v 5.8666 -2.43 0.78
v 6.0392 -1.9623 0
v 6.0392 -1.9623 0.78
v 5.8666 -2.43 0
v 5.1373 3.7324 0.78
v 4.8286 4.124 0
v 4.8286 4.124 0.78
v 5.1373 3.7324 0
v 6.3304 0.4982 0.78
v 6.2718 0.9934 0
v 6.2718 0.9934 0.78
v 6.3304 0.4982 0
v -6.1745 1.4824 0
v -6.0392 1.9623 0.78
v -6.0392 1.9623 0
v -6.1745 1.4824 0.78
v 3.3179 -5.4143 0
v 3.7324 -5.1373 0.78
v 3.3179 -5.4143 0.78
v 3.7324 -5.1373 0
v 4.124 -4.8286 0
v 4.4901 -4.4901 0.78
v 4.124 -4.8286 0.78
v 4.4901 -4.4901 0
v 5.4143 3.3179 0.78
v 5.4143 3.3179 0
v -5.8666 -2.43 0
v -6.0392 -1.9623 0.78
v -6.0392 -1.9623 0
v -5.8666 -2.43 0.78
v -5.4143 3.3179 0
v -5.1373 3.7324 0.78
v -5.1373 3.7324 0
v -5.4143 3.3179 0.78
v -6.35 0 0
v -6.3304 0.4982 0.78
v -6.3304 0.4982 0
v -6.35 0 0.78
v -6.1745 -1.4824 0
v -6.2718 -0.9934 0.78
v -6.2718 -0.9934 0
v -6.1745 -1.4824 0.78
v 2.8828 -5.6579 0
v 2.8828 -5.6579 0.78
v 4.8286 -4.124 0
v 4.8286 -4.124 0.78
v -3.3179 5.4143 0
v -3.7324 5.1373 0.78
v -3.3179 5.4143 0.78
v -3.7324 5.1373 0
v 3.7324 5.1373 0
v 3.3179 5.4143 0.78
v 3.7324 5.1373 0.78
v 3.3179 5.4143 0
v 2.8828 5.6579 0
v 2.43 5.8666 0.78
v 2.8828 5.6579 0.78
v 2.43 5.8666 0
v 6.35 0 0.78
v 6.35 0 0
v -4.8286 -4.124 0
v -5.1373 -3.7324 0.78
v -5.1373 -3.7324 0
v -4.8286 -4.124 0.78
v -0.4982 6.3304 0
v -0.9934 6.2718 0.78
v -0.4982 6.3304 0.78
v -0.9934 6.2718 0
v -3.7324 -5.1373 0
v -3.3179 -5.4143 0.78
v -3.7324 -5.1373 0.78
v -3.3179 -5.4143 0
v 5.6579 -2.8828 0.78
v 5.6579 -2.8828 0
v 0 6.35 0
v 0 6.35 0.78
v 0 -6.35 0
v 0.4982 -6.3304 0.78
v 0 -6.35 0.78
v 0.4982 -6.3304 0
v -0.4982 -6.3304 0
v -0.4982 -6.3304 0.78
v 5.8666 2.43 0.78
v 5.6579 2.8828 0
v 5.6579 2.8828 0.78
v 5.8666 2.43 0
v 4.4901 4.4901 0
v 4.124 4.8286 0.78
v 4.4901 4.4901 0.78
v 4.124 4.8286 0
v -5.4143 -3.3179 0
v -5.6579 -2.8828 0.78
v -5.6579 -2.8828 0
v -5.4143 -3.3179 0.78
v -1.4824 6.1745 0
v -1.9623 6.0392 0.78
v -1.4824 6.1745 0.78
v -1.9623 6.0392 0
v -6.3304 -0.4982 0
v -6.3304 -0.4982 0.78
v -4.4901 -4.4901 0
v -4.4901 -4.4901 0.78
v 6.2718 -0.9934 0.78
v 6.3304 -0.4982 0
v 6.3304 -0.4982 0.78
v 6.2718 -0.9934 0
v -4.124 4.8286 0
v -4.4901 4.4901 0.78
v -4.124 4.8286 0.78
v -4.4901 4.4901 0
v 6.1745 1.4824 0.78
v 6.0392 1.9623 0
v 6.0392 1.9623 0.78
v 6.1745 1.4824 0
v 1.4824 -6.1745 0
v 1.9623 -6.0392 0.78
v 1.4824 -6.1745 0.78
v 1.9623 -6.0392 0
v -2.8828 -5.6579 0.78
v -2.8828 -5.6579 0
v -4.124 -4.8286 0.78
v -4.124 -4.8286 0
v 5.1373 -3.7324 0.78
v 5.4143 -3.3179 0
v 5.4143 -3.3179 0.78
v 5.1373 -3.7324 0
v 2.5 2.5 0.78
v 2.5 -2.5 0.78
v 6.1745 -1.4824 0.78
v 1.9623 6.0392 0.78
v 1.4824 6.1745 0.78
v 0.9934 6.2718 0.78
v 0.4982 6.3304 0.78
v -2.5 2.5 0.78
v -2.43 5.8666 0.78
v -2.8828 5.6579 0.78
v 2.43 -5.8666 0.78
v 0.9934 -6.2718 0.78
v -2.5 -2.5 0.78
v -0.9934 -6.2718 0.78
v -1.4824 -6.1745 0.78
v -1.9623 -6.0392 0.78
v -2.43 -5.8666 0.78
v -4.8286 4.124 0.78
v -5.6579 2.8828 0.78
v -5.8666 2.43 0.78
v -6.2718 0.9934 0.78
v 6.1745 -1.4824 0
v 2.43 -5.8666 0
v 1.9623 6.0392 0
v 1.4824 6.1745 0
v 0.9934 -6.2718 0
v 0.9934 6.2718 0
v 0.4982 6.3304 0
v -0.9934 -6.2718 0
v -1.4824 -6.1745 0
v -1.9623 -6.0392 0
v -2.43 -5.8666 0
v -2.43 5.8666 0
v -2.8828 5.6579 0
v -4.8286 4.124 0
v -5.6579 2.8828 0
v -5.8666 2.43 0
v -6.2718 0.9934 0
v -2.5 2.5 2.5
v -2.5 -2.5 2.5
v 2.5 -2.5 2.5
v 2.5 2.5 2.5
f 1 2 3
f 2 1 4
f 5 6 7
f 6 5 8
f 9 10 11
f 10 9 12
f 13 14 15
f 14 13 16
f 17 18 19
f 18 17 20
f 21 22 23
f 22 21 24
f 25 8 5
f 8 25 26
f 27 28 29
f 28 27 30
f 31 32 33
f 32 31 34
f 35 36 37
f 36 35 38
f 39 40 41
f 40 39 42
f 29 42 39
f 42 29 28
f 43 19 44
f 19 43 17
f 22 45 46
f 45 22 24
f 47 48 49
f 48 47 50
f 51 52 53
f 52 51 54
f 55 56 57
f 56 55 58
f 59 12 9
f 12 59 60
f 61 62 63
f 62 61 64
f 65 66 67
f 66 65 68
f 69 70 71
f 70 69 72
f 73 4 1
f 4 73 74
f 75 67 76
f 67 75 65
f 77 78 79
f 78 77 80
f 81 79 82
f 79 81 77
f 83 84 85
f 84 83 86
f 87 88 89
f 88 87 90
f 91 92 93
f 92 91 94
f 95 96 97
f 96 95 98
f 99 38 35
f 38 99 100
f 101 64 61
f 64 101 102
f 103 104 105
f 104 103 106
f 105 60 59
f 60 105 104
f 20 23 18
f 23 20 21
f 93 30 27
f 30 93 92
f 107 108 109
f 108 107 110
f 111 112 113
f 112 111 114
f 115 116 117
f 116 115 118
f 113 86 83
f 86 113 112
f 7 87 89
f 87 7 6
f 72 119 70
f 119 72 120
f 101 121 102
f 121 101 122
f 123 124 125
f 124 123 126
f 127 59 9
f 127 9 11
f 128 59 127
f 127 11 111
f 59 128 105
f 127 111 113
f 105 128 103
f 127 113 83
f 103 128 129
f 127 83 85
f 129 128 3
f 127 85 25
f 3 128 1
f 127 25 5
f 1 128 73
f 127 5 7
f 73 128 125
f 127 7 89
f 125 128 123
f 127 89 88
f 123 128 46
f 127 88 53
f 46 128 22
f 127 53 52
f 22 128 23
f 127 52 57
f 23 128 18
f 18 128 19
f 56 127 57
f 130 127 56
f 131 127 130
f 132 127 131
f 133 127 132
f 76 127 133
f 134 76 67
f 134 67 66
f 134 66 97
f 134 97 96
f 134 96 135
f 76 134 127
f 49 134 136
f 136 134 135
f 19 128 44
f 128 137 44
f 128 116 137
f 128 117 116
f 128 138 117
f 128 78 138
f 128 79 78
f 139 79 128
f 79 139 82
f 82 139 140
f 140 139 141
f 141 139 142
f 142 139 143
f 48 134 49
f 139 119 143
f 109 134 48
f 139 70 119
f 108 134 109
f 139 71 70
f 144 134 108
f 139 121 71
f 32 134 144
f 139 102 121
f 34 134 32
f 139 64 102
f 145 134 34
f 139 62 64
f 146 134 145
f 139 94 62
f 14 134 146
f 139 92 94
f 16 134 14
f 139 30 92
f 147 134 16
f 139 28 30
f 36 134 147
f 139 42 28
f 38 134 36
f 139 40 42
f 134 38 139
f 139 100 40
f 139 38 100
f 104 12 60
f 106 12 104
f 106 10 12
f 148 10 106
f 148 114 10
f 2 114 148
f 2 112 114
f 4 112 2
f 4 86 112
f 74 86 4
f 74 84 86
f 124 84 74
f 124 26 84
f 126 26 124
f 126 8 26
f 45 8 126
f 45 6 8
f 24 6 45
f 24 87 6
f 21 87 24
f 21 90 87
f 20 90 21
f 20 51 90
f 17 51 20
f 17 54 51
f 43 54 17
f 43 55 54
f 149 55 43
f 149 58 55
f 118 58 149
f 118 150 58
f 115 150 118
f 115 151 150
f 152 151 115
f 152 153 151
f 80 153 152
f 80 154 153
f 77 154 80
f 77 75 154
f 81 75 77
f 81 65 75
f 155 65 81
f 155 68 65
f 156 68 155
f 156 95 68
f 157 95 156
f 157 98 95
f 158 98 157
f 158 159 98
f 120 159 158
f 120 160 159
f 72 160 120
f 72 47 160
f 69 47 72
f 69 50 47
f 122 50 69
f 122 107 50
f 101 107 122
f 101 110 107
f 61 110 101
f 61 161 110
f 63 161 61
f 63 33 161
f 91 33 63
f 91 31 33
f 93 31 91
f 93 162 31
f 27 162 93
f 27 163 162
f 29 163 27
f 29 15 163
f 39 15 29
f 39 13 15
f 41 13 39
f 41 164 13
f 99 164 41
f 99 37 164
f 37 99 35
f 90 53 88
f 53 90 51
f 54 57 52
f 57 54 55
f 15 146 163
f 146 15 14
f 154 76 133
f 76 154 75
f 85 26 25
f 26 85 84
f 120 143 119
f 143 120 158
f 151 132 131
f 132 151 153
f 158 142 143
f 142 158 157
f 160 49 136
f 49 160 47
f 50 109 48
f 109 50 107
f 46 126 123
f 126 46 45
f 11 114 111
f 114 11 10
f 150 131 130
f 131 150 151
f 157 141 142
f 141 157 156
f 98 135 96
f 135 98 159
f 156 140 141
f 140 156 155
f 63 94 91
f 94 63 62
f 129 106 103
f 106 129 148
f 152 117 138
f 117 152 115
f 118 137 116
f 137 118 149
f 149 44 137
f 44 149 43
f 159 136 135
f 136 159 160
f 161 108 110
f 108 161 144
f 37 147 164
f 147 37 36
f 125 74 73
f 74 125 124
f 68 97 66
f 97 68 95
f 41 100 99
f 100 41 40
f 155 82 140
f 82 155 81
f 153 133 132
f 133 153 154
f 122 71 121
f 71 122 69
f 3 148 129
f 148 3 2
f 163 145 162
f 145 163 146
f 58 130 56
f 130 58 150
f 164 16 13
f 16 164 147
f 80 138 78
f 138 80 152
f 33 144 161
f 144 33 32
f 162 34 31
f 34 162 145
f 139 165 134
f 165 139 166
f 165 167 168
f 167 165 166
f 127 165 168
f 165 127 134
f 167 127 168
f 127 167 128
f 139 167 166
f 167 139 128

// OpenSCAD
$fa = 1;
$fs = 0.5;

// This appears to be a standard circuit board size
BOARD_THICKNESS = 0.78;

neopixel();

module neopixel() {
  // Board
  cylinder(d=12.7, h=BOARD_THICKNESS);

  // LED
  linear_extrude(2.5)
  square([5, 5], center=true);
}
